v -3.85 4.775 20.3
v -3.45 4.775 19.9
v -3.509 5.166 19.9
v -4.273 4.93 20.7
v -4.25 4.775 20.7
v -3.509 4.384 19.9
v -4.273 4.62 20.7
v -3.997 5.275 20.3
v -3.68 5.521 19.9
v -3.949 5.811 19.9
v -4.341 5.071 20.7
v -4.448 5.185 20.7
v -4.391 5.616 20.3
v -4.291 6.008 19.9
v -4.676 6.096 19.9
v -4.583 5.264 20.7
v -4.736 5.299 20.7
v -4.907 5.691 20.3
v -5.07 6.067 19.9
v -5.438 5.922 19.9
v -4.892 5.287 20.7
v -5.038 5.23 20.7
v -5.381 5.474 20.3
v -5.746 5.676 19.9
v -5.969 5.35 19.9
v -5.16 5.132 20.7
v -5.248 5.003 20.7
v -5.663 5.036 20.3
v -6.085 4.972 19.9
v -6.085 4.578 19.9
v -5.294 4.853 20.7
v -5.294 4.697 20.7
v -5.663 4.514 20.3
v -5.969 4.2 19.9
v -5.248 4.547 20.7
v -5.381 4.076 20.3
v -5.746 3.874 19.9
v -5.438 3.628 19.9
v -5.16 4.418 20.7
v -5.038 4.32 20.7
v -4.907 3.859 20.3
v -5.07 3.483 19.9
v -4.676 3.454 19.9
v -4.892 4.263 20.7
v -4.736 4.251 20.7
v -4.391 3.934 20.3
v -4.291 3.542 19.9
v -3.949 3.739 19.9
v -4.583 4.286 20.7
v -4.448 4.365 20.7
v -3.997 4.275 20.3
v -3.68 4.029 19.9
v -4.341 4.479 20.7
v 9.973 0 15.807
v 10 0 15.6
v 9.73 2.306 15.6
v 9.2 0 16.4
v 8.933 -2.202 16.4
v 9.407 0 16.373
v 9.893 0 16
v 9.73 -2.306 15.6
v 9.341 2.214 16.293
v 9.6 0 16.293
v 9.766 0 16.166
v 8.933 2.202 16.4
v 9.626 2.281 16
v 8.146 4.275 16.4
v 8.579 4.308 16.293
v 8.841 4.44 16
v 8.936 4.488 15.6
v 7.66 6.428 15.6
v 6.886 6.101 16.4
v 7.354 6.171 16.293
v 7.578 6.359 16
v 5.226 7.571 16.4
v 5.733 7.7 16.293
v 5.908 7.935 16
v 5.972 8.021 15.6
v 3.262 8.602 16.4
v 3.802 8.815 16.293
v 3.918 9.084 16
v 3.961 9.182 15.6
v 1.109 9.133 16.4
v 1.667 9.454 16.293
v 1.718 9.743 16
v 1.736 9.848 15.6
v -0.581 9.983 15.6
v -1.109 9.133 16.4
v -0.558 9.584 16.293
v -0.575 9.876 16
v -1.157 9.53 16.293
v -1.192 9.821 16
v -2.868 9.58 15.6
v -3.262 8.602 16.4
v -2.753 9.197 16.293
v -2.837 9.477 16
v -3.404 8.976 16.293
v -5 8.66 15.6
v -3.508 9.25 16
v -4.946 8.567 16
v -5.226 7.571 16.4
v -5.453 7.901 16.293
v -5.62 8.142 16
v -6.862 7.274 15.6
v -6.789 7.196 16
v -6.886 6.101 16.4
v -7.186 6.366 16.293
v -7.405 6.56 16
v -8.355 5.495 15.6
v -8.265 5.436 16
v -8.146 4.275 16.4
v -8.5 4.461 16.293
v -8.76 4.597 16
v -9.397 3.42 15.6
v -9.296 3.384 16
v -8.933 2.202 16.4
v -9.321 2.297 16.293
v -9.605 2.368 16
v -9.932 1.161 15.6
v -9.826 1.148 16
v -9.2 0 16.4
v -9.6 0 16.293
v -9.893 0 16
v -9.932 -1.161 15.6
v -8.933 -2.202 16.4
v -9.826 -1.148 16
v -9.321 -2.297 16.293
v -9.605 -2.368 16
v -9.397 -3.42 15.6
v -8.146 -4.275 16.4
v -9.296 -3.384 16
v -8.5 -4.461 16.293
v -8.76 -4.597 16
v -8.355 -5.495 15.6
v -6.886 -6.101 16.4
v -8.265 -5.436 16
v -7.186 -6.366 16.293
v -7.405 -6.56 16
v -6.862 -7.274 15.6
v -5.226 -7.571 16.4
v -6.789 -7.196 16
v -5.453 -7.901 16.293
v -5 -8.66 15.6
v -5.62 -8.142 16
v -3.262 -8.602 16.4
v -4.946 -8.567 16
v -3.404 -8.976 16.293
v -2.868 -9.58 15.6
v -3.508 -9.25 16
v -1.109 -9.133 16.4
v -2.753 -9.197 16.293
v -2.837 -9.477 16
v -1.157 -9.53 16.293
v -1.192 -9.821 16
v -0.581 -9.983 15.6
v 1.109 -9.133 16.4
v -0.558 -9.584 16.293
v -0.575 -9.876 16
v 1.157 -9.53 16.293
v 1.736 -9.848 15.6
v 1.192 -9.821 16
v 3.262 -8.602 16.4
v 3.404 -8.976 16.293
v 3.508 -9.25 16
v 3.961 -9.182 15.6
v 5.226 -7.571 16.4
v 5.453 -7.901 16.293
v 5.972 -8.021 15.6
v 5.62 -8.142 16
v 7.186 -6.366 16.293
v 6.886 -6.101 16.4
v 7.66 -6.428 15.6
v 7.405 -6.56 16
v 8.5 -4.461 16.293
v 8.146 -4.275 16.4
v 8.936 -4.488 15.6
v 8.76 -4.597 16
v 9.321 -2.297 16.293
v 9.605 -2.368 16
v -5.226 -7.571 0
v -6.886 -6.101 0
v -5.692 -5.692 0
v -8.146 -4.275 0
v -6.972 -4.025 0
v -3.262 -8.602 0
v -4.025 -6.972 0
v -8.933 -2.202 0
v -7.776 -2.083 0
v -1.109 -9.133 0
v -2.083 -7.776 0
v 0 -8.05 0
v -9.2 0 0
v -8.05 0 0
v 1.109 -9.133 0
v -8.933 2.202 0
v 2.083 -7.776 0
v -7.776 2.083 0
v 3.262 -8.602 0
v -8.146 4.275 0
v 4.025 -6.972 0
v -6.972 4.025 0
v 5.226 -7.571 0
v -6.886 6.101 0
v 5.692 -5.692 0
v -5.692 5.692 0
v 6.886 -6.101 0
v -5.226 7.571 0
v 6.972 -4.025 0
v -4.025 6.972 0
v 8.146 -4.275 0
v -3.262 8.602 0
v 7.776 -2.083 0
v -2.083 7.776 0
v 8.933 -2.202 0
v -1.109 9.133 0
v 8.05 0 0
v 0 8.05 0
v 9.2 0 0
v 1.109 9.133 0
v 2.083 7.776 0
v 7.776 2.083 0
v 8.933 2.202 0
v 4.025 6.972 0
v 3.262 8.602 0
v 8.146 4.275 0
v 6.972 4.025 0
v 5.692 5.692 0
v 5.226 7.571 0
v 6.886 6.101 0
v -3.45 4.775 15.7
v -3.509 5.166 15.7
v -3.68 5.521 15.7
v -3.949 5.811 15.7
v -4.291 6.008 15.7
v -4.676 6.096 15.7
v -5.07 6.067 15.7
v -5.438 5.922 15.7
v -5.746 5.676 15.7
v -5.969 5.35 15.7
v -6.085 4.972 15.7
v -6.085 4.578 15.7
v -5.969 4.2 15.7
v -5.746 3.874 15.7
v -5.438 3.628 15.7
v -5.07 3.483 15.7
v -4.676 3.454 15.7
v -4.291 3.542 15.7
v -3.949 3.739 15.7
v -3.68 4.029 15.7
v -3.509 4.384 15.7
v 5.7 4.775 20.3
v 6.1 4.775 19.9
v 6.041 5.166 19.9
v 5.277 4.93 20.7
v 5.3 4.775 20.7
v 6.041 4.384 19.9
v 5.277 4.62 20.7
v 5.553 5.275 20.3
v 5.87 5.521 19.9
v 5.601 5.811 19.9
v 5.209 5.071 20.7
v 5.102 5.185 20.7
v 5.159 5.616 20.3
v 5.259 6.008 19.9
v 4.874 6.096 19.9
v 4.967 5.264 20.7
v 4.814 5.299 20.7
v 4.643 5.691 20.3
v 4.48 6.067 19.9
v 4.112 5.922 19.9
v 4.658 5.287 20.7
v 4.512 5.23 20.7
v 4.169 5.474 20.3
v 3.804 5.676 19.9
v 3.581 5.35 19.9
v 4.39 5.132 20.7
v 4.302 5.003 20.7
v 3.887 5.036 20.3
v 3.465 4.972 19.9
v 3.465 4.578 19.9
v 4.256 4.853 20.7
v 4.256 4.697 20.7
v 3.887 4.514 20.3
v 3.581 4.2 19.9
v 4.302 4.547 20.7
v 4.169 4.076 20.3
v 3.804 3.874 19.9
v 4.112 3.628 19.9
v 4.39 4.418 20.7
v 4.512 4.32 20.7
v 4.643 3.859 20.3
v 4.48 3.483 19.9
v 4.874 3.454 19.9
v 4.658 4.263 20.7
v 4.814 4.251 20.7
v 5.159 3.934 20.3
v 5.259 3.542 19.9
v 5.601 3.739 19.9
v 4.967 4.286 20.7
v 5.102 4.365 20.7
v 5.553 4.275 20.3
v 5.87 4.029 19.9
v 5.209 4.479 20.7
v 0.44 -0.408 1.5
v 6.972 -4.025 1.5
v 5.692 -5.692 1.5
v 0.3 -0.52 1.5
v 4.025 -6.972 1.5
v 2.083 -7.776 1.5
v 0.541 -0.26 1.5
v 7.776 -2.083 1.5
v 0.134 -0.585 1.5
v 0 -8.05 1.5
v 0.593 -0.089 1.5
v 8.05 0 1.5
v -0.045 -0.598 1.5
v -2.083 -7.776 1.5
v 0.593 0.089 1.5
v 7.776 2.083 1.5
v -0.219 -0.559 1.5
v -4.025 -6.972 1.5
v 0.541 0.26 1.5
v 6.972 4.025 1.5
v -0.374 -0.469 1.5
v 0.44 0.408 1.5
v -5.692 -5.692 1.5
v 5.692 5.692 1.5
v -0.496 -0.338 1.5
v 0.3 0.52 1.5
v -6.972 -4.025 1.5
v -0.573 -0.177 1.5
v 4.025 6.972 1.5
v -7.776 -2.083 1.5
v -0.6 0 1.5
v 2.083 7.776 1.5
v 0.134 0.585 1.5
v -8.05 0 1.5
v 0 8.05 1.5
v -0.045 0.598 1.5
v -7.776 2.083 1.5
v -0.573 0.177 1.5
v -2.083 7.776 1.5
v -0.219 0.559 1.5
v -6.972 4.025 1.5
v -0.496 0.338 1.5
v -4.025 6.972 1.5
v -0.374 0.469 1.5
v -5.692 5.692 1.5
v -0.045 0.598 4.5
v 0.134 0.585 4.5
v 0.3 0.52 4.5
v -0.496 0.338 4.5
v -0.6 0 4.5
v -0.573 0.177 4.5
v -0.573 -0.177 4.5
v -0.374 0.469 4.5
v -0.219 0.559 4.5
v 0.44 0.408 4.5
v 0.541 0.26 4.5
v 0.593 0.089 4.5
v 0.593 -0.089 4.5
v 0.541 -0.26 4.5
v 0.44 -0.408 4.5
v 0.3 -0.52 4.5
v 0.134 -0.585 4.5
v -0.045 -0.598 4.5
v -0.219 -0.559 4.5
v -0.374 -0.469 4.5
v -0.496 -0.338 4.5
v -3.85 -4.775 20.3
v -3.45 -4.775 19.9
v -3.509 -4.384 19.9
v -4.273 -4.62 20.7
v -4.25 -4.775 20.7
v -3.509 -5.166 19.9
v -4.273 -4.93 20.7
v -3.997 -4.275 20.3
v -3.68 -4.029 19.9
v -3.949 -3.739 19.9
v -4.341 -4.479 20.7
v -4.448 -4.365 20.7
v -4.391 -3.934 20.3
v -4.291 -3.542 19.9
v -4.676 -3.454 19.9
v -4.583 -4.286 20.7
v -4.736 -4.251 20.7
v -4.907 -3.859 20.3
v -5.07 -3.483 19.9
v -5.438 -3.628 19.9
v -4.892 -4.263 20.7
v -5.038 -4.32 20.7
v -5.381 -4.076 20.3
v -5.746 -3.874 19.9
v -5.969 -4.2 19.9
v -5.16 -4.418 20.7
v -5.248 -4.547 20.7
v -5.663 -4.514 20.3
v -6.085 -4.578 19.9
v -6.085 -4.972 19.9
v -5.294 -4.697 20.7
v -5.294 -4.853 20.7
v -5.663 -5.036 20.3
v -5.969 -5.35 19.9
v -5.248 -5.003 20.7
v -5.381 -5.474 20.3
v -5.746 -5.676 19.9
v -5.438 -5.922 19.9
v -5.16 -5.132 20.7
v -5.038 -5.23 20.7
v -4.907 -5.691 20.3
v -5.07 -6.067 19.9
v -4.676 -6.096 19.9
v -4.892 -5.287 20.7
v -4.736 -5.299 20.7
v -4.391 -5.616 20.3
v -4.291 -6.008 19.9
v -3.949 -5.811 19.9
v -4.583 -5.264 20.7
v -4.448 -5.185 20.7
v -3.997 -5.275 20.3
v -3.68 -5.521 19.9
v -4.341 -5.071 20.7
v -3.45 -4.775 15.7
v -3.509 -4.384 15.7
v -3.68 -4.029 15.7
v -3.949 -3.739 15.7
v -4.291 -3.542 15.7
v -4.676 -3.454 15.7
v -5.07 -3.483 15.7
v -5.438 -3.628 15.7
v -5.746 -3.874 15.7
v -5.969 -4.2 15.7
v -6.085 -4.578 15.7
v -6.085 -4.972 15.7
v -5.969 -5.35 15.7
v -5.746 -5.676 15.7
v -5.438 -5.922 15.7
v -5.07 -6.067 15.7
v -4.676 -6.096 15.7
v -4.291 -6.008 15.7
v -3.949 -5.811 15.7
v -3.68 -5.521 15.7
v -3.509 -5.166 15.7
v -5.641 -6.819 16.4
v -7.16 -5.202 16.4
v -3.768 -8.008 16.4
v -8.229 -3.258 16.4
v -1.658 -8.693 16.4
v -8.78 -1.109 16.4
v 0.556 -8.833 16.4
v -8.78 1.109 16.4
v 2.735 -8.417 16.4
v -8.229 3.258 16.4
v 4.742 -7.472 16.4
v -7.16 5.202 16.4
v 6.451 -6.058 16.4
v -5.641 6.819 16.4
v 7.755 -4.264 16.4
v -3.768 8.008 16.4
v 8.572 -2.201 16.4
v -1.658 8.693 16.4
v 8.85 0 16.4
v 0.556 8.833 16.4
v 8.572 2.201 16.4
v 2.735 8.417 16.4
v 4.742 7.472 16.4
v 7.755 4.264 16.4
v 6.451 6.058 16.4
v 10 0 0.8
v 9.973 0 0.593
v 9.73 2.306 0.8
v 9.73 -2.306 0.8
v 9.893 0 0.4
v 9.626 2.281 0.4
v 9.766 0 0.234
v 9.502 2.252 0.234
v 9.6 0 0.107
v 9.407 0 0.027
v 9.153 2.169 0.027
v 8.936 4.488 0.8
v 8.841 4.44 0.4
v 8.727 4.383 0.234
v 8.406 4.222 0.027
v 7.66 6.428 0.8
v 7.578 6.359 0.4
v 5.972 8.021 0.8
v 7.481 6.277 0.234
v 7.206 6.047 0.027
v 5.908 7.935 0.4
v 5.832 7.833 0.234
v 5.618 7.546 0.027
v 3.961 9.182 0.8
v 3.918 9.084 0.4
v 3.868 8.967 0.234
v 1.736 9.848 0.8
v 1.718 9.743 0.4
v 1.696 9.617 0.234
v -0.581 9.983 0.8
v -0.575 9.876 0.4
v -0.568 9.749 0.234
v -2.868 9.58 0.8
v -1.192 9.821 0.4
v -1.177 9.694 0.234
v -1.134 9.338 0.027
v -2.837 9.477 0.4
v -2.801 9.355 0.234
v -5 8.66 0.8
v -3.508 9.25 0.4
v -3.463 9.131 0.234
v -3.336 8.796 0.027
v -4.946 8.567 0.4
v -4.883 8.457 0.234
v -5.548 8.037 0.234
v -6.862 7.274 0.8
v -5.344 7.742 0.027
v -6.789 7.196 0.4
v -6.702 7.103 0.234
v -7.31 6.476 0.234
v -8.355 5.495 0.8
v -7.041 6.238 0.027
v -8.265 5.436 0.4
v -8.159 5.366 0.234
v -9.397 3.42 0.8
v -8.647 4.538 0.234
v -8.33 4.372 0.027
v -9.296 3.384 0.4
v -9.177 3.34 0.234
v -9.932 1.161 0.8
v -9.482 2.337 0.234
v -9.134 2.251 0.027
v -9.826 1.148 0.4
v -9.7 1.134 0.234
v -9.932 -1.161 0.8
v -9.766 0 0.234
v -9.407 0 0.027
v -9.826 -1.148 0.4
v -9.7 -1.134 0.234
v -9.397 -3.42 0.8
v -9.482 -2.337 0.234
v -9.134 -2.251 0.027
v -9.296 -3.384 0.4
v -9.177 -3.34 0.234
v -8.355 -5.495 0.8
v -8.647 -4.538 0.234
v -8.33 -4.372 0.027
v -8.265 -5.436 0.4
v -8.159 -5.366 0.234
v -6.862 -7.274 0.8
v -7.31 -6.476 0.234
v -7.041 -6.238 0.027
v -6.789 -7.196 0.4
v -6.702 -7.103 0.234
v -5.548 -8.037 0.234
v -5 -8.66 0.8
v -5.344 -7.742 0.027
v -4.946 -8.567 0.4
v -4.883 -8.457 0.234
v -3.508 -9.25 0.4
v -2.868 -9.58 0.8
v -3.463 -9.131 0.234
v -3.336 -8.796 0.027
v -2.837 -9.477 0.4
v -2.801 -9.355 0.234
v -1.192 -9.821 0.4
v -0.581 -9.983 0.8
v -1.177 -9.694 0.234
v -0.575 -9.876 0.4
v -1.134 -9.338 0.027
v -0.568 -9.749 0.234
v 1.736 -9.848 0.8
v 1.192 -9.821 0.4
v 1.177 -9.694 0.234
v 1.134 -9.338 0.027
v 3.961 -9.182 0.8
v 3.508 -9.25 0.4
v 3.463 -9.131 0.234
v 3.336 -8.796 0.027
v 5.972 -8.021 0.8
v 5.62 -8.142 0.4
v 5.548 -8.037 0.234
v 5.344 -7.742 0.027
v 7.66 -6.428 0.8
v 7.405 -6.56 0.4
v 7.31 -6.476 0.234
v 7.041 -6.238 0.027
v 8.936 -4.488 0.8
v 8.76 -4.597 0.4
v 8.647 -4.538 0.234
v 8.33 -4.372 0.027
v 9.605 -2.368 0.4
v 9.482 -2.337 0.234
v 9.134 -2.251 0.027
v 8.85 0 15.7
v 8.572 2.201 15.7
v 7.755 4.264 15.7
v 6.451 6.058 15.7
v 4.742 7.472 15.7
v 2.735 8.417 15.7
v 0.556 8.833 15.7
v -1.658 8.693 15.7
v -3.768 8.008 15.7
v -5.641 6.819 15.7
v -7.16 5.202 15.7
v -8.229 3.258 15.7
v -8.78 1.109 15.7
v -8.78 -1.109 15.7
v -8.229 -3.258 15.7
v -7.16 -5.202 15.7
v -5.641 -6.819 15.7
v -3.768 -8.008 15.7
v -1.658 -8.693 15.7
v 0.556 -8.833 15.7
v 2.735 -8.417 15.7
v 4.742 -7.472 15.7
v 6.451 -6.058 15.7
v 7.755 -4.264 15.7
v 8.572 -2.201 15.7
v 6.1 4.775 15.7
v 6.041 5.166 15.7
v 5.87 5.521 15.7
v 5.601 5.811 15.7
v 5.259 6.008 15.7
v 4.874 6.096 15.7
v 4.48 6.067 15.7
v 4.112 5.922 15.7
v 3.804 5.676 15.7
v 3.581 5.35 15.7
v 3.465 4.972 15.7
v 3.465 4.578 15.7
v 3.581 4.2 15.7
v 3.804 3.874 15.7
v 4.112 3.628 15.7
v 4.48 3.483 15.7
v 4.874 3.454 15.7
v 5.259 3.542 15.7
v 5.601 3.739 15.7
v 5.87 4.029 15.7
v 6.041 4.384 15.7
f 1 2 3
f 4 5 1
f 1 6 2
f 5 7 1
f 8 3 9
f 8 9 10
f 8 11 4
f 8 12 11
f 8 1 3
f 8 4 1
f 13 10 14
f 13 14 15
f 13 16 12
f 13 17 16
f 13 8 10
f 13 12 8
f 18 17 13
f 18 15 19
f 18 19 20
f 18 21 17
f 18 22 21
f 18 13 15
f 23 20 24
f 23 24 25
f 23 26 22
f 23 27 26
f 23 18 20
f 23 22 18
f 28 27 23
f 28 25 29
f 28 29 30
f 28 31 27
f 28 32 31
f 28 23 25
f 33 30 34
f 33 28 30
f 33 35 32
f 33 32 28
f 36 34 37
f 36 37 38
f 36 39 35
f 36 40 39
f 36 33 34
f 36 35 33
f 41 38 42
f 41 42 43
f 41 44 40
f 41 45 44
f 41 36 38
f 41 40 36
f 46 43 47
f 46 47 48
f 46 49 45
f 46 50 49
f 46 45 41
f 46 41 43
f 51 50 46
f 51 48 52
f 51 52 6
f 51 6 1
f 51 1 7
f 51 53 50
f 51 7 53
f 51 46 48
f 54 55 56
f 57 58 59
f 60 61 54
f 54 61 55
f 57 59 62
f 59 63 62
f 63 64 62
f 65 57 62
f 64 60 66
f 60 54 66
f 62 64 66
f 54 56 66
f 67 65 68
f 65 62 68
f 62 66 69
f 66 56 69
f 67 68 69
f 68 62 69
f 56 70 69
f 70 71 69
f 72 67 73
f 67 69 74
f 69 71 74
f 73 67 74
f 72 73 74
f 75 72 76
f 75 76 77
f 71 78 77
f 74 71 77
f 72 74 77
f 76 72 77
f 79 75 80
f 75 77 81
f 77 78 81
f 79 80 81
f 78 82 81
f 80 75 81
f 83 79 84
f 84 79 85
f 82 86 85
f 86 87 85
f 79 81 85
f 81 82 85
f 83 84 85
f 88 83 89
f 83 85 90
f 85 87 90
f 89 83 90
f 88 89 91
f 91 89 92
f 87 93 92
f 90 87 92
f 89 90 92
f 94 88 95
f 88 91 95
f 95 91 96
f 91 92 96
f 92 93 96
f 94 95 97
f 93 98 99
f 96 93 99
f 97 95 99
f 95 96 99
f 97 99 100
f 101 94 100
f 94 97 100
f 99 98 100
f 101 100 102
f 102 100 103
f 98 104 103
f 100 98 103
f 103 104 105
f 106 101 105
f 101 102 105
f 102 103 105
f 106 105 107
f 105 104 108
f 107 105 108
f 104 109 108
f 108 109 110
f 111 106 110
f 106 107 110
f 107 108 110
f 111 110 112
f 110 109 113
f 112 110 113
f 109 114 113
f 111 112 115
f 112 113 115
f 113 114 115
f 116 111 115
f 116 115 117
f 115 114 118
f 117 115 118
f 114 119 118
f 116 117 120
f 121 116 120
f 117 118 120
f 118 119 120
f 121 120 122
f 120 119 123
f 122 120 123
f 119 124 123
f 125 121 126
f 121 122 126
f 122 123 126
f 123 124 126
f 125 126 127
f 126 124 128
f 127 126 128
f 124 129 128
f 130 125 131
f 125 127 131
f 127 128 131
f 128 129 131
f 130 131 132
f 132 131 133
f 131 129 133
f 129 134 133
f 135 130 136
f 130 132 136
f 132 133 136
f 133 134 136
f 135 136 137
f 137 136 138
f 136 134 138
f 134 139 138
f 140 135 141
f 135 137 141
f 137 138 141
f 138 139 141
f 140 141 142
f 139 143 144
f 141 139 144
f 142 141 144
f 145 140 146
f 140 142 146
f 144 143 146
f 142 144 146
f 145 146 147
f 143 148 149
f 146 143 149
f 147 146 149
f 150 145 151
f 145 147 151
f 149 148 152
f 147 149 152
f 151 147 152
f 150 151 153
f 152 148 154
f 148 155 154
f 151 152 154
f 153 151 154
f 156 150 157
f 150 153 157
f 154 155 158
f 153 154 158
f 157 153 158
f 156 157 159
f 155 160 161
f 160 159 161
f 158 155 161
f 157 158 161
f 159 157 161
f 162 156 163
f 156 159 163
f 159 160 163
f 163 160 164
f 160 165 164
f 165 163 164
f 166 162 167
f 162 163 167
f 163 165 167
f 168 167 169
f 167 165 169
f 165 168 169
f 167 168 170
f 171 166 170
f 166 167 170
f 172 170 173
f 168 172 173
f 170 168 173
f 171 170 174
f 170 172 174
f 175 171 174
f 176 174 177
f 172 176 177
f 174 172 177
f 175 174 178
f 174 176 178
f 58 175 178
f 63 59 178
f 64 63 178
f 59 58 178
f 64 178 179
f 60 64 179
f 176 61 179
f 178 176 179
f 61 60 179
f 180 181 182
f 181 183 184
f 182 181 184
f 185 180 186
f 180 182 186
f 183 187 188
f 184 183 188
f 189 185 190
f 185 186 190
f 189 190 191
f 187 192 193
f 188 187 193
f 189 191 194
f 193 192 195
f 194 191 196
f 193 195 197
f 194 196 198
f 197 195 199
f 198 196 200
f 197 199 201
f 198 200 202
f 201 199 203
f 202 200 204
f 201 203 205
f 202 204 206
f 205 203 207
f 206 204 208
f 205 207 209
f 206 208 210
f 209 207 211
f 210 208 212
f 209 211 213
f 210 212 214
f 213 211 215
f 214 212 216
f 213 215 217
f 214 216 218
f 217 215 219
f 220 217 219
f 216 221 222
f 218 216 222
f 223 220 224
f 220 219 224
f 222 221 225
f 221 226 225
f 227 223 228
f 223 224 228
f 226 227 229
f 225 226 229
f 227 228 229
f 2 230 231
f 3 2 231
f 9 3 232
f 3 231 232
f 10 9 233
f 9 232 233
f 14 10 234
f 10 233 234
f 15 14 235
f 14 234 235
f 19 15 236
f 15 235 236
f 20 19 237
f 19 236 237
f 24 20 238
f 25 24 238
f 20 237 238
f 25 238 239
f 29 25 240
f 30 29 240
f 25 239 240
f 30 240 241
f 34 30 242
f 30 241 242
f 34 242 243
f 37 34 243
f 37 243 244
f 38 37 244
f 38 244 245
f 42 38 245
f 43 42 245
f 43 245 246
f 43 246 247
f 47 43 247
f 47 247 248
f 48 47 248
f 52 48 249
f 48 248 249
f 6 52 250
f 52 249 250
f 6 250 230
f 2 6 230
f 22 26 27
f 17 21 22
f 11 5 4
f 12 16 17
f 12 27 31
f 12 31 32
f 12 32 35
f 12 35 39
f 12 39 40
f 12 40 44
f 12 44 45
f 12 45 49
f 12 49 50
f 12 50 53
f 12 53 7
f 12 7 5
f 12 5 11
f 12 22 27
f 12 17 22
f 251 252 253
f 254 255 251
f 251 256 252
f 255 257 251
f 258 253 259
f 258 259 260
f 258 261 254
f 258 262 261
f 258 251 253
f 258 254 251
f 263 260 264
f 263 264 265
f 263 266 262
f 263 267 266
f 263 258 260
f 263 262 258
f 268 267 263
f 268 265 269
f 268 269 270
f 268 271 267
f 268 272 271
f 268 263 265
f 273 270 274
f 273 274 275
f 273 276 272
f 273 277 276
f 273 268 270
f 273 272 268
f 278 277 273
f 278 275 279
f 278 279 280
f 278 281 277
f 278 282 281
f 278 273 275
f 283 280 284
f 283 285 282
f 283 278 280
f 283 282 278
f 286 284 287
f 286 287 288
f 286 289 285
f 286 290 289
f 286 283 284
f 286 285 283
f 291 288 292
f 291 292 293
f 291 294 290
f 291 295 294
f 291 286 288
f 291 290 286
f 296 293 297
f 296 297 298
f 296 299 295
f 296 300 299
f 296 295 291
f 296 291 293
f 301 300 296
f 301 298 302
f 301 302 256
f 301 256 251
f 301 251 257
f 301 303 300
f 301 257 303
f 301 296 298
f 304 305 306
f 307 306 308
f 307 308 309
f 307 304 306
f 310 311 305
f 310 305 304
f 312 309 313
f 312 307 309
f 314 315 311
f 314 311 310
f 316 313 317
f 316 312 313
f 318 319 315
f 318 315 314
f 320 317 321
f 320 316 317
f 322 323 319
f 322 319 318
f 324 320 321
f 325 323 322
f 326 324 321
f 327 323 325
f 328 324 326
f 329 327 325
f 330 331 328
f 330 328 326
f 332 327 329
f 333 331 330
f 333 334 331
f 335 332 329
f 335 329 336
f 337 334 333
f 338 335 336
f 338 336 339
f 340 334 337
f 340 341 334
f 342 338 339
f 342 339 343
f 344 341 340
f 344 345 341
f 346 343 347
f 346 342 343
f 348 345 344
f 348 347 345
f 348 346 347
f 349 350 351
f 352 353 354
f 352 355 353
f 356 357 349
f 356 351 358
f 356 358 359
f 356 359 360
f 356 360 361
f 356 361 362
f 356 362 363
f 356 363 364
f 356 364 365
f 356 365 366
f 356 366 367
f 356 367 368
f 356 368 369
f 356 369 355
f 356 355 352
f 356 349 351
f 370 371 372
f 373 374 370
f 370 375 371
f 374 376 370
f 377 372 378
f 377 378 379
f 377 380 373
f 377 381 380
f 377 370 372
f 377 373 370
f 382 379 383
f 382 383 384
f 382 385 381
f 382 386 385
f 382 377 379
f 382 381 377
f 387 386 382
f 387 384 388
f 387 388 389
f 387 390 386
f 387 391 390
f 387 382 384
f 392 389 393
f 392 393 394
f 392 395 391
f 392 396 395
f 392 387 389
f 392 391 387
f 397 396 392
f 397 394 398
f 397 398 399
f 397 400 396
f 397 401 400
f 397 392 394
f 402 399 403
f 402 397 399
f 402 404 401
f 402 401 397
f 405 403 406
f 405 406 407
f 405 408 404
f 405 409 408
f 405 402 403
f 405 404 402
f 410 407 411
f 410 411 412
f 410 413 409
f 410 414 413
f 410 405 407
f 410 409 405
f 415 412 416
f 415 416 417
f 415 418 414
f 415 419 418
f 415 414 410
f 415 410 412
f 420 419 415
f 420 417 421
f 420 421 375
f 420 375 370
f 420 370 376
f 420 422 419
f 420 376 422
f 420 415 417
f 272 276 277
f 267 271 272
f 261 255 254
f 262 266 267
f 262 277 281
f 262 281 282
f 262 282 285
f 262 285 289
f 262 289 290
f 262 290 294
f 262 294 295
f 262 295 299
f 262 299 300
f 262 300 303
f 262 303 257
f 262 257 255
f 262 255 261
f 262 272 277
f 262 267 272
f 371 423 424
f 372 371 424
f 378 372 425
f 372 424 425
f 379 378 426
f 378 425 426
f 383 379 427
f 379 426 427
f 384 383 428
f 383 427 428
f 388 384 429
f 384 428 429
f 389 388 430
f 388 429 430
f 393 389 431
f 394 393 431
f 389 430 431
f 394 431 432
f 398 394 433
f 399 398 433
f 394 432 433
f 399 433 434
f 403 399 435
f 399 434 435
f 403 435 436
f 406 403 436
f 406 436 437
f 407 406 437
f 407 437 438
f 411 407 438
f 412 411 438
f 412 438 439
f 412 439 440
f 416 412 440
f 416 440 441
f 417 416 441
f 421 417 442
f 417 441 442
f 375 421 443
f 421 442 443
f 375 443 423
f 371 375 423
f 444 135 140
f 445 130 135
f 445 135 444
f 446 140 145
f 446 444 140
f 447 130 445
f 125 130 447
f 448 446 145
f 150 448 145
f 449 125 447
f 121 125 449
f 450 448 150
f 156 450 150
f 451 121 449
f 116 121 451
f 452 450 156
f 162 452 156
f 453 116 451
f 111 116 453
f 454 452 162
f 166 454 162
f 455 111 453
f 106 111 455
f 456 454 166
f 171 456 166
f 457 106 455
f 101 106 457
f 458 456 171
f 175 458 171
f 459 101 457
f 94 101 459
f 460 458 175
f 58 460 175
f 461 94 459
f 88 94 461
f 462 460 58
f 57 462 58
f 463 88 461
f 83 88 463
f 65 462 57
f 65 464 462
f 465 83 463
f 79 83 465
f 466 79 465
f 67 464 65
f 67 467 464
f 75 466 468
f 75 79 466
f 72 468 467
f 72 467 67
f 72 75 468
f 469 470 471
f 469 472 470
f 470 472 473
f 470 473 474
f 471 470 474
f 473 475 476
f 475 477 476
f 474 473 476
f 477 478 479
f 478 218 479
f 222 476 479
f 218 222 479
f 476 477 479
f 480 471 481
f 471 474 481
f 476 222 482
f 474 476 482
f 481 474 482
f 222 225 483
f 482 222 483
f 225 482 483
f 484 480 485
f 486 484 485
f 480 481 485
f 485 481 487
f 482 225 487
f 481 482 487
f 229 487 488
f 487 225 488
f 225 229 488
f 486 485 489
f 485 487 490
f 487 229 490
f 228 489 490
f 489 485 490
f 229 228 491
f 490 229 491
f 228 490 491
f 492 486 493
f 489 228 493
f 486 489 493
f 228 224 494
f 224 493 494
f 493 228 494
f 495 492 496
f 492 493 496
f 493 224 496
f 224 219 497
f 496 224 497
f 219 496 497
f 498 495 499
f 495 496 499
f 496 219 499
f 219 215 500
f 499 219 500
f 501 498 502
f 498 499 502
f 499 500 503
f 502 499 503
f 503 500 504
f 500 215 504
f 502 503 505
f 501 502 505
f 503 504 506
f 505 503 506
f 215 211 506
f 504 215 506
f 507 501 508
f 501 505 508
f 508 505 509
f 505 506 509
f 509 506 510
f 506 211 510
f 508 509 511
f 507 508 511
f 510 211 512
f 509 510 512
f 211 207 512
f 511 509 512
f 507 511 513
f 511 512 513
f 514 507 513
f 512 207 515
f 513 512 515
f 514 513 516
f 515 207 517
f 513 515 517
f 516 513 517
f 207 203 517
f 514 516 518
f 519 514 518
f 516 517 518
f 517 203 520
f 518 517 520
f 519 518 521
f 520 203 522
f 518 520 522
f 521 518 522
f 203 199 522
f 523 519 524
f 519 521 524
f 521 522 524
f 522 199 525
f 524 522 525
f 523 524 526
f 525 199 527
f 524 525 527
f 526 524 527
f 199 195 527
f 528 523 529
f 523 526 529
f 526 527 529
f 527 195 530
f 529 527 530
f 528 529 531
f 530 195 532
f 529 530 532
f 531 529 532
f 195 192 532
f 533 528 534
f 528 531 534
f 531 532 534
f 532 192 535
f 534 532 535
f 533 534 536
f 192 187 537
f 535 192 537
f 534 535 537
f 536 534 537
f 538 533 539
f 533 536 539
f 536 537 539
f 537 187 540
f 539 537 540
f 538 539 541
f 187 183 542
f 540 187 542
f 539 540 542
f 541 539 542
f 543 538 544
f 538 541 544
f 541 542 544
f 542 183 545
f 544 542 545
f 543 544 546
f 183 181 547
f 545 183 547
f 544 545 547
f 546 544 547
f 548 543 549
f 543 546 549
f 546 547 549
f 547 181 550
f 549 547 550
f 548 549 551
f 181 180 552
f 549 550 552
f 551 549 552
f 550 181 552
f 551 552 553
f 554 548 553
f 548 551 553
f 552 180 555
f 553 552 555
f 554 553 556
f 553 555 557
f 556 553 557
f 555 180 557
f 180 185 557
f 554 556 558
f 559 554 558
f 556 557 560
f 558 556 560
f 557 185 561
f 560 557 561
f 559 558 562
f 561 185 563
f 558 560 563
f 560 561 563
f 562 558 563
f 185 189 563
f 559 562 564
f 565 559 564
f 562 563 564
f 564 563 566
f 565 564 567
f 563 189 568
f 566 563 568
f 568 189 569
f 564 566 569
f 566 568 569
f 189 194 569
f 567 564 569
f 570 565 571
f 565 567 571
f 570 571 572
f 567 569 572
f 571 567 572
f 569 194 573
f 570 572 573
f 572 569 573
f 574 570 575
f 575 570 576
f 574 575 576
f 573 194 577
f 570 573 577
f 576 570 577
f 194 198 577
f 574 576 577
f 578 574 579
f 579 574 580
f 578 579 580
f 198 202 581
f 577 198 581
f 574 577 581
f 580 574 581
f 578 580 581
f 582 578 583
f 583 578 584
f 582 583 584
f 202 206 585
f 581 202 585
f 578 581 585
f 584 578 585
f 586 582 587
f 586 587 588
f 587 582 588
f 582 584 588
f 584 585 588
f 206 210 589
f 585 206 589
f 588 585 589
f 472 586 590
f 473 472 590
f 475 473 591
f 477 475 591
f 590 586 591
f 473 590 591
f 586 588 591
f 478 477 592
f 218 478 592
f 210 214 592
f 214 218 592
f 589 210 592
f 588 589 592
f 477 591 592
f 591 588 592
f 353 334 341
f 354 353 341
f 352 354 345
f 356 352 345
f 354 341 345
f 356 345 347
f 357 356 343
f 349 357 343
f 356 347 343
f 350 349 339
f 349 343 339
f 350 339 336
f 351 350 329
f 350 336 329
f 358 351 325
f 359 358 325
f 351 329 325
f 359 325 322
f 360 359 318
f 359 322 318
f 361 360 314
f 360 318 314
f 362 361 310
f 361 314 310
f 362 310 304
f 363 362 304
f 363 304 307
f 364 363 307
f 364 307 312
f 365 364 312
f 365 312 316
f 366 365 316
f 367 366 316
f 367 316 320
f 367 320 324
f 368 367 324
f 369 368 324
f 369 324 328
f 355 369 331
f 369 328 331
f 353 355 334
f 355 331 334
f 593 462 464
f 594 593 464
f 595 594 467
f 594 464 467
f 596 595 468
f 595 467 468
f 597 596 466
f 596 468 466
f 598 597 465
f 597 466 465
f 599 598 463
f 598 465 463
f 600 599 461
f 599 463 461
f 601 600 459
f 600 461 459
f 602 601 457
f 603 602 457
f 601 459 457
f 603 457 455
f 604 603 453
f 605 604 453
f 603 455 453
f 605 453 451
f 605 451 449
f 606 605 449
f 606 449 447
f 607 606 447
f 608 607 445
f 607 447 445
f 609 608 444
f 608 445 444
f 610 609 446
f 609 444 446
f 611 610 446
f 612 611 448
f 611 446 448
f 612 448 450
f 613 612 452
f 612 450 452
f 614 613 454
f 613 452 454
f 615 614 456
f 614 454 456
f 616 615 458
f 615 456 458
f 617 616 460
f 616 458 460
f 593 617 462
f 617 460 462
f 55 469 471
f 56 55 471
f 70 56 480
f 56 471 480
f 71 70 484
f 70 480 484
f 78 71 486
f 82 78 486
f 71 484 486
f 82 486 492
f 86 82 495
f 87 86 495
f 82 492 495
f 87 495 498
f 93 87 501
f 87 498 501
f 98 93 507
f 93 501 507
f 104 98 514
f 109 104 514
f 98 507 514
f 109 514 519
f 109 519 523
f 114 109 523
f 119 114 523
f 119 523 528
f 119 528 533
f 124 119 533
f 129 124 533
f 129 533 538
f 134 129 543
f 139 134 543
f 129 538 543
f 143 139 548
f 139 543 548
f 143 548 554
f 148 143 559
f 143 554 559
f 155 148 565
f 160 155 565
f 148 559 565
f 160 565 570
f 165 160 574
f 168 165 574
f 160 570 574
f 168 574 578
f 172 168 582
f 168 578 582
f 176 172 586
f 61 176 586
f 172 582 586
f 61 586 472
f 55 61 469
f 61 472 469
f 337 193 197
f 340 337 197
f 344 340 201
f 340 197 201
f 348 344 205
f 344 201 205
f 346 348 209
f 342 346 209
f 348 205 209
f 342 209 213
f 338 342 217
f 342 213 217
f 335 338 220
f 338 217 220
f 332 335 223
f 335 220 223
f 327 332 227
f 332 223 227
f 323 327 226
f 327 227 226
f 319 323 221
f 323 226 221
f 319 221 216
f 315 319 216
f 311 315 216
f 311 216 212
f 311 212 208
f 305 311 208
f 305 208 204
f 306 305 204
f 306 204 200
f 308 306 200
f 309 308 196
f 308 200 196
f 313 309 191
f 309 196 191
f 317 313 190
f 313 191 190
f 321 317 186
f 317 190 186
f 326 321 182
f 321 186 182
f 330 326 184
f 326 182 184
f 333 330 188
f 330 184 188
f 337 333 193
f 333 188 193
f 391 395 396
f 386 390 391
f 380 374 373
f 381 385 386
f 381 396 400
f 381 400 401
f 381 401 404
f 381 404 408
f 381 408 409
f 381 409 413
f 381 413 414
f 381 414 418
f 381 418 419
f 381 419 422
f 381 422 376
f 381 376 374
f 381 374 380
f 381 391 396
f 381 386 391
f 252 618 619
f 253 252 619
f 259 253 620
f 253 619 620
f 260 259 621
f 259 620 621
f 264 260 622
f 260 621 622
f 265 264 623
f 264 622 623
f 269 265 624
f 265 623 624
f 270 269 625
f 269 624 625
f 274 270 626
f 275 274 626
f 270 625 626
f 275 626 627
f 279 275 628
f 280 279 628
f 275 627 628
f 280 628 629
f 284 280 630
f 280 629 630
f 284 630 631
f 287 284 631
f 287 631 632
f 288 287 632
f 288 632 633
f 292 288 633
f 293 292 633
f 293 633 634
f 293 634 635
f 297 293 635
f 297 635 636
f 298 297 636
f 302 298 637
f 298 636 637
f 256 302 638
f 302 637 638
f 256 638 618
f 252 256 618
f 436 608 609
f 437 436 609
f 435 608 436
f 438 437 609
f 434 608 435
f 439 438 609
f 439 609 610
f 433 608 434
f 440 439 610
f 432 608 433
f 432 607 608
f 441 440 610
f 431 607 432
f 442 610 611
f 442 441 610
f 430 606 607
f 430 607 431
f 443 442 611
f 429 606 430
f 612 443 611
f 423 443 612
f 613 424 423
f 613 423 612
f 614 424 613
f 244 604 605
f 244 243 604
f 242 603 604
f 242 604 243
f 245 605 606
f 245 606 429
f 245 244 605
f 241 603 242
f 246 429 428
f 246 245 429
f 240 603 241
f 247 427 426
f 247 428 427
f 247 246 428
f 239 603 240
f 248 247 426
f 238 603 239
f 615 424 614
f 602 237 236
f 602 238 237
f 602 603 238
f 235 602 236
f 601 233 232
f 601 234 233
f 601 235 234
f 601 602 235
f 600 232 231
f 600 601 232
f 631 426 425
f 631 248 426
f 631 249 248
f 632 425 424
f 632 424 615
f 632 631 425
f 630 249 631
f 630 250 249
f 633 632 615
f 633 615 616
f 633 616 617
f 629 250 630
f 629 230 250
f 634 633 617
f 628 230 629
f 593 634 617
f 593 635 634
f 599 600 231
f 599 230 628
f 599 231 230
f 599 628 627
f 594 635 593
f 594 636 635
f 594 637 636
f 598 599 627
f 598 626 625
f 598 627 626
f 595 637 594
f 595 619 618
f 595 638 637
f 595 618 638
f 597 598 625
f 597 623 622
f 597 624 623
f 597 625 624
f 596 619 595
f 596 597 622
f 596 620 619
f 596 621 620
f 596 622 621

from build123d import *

# Parameters (mm, degrees)
SKETCH_1_R          = 10
EXTRUDE_1_DEPTH     = 16.4
SKETCH_2_R          = 8.85
CUT_EXTRUDE_1_DEPTH = 0.7
SKETCH_3_R          = 1.325
EXTRUDE_2_DEPTH     = 5
CHAMFER_1_SIZE      = 0.8
SKETCH_4_R          = 8.05
CUT_EXTRUDE_2_DEPTH = 1.5
SKETCH_5_R          = 0.6
CUT_EXTRUDE_3_DEPTH = 3
FILLET_1_R          = 0.8


with BuildPart() as part:
    # Эскиз1 → Бобышка-Вытянуть1 (new body)
    with BuildSketch(Plane.XY):
        Circle(SKETCH_1_R)
    extrude(amount=EXTRUDE_1_DEPTH)

    # Эскиз2 → Вырез-Вытянуть1 (cut)
    with BuildSketch(Plane.XY.offset(16.4)):
        Circle(SKETCH_2_R)
    extrude(amount=-CUT_EXTRUDE_1_DEPTH, mode=Mode.SUBTRACT)

    # Эскиз3 → Бобышка-Вытянуть2 (add)
    with BuildSketch(Plane.XY.offset(15.7)):
        with Locations((-4.775, 4.775)):
            Circle(SKETCH_3_R)
        with Locations((-4.775, -4.775)):
            Circle(SKETCH_3_R)
        with Locations((4.775, 4.775)):
            Circle(SKETCH_3_R)
    extrude(amount=EXTRUDE_2_DEPTH)

    # Фаска1
    chamfer_1_edges = [part.edges().sort_by_distance(p)[0] for p in [
        (-6.1, 4.775, 20.7),
        (-6.1, -4.775, 20.7),
        (3.45, 4.775, 20.7),
    ]]
    chamfer(chamfer_1_edges, length=CHAMFER_1_SIZE)

    # Эскиз4 → Вырез-Вытянуть2 (cut)
    with BuildSketch(Plane(origin=(0, 0, 0), x_dir=(-1, 0, 0), z_dir=(0, 0, -1))):
        Circle(SKETCH_4_R)
    extrude(amount=-CUT_EXTRUDE_2_DEPTH, mode=Mode.SUBTRACT)

    # Эскиз5 → Вырез-Вытянуть3 (cut)
    with BuildSketch(Plane(origin=(0, 0, 1.5), x_dir=(-1, 0, 0), z_dir=(0, 0, -1))):
        Circle(SKETCH_5_R)
    extrude(amount=-CUT_EXTRUDE_3_DEPTH, mode=Mode.SUBTRACT)

    # Скругление1
    fillet_1_edges = [part.edges().sort_by_distance(p)[0] for p in [
        (-10, 0, 0),
        (-10, 0, 16.4),
    ]]
    fillet(fillet_1_edges, radius=FILLET_1_R)


solid = part.part
